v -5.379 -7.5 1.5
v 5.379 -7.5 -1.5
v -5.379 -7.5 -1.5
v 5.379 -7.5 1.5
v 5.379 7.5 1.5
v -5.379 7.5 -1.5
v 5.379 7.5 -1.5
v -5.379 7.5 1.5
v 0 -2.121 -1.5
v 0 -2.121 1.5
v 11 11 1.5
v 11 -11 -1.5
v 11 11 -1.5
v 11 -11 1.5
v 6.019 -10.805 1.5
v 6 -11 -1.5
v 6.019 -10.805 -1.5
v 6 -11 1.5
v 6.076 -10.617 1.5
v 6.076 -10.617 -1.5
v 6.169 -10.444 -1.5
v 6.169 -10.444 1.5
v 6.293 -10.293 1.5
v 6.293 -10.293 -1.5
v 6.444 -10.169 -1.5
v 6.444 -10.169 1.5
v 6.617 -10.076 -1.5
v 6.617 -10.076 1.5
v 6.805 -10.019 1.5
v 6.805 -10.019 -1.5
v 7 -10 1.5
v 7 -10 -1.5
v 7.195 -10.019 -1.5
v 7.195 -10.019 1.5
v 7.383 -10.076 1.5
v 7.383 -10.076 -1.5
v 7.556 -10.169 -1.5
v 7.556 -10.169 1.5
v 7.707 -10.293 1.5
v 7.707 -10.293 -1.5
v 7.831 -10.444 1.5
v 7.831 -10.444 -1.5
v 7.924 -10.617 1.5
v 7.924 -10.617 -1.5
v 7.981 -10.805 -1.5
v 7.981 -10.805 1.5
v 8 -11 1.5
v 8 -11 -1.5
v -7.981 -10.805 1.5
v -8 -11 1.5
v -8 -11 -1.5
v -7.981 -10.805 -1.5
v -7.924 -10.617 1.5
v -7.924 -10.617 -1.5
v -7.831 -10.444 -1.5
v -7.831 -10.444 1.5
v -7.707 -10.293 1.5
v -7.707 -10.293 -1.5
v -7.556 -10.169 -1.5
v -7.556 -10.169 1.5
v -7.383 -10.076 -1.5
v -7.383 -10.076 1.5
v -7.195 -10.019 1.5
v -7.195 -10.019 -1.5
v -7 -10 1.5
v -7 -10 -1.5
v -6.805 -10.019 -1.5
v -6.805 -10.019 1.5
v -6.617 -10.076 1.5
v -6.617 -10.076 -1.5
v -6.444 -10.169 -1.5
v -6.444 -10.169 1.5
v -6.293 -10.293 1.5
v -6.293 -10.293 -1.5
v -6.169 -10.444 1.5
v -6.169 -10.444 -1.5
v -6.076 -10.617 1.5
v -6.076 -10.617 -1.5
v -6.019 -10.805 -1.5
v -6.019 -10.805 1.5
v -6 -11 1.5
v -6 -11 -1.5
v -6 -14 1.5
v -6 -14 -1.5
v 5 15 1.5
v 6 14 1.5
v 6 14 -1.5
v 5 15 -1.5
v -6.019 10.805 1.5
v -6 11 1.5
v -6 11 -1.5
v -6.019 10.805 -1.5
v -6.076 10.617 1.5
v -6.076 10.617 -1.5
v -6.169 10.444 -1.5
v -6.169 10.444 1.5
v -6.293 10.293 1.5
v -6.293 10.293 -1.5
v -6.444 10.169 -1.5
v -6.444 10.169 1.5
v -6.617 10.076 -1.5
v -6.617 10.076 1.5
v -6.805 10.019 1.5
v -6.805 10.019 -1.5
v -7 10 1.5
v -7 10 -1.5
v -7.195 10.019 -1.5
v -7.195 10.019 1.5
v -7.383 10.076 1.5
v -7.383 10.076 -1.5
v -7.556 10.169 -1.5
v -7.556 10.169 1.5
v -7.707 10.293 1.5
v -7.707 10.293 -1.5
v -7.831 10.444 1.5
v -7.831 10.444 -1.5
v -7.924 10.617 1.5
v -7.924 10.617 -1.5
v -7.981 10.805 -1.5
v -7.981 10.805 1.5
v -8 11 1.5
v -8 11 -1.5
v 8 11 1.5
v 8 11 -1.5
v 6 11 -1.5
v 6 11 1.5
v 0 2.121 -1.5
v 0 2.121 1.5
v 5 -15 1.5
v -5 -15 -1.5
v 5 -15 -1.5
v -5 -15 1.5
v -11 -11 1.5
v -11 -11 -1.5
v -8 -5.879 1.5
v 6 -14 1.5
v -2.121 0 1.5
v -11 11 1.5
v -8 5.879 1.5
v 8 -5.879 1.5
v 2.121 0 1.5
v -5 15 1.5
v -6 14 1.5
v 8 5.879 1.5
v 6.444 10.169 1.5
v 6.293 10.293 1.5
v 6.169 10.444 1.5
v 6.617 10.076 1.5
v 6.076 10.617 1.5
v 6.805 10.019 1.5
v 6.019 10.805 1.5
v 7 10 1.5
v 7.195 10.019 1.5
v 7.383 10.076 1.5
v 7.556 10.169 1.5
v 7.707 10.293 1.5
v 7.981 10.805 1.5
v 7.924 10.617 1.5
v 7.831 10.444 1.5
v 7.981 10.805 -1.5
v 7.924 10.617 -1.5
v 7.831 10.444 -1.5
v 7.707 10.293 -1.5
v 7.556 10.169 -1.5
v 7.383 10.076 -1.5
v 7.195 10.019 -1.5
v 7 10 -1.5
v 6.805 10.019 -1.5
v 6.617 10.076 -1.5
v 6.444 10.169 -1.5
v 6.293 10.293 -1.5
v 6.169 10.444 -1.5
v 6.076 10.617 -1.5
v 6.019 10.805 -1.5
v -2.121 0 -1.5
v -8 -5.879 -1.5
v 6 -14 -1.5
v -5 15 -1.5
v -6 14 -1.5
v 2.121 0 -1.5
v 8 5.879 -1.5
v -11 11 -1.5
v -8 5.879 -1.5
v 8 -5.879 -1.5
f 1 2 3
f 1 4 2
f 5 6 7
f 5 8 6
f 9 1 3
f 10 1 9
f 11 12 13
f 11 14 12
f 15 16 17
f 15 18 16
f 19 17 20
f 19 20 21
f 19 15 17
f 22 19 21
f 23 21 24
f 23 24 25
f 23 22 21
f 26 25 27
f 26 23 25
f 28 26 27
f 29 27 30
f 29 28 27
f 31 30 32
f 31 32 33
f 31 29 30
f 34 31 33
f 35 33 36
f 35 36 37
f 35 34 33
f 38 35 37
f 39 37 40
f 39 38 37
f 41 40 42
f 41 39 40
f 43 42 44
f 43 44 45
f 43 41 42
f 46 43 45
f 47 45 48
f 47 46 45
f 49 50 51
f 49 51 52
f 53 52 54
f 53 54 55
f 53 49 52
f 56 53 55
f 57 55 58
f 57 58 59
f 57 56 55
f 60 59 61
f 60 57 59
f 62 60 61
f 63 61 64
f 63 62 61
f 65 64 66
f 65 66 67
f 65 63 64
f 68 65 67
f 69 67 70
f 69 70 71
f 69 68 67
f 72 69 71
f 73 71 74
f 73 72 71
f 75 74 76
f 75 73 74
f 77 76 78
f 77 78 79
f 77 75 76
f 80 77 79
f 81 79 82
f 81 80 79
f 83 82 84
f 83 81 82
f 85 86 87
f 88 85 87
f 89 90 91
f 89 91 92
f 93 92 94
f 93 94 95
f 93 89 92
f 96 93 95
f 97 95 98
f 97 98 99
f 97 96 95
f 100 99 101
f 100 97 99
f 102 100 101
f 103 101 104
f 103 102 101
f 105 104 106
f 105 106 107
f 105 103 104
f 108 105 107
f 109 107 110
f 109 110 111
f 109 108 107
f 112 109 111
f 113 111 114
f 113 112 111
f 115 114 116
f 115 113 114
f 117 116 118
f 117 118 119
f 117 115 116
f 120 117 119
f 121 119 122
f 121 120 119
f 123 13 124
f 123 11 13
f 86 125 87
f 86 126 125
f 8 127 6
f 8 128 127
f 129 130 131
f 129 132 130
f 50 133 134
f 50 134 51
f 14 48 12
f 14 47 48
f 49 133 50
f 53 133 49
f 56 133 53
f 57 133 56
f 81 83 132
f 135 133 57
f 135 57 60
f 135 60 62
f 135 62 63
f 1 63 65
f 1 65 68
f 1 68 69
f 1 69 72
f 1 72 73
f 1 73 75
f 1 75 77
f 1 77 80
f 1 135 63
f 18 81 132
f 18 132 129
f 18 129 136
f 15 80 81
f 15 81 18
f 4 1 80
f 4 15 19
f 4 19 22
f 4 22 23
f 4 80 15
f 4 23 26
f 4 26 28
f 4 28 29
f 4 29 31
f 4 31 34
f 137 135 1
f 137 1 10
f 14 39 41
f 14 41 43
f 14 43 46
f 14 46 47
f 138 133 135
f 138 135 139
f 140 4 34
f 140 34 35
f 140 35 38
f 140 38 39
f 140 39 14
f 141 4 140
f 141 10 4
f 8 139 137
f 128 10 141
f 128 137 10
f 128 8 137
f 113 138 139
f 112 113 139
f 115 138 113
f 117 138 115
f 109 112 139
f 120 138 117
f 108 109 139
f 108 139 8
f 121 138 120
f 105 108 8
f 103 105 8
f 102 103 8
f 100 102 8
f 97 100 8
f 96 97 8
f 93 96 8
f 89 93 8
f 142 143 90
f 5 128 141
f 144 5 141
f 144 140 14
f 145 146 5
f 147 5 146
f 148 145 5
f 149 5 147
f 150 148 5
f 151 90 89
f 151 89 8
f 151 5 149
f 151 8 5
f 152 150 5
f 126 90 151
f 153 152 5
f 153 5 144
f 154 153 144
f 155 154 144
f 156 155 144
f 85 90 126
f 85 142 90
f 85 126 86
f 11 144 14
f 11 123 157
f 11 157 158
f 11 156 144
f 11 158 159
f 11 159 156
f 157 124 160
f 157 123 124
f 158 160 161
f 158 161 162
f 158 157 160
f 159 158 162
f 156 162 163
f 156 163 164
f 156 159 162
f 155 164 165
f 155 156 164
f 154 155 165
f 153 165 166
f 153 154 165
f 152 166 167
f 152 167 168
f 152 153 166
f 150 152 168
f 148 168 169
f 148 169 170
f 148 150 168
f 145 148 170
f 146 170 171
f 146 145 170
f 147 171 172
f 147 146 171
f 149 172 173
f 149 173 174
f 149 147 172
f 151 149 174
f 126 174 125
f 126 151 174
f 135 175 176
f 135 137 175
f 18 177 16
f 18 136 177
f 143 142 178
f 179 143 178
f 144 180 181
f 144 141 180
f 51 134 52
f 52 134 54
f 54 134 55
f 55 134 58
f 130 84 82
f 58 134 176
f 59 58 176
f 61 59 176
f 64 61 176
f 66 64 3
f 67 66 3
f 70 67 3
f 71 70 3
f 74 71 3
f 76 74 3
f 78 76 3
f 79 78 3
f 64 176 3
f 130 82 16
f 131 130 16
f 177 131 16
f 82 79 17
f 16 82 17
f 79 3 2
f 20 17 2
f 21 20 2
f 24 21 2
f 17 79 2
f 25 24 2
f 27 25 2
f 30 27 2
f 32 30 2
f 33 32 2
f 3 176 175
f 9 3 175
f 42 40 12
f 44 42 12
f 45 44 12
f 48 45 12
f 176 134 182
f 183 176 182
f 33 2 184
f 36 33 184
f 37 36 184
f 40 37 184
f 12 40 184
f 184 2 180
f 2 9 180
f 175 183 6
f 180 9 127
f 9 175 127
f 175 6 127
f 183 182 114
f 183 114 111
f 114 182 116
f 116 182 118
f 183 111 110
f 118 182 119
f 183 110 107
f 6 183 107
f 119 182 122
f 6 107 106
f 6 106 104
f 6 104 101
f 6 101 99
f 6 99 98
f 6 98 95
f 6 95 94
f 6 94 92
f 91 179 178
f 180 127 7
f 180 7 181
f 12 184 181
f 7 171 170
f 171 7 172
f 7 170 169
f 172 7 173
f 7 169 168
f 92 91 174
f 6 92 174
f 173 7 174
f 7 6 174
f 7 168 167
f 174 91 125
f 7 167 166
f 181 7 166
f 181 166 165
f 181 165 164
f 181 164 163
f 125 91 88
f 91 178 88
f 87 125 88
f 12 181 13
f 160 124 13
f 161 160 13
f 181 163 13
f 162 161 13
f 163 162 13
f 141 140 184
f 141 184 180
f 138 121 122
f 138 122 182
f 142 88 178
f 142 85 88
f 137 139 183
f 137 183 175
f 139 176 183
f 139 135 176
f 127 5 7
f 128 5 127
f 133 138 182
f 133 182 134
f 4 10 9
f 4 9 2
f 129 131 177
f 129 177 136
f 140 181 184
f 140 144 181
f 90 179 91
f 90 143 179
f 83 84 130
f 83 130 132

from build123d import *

# Parameters (mm, degrees)
EXTRUDE_1_DEPTH = 1.5
CHAMFER_1_SIZE  = 1


with BuildPart() as part:
    # 草图1 → 凸台-拉伸1 (new, symmetric)
    with BuildSketch(Plane.XY):
        with BuildLine():
            Line((-6, 15), (-6, 11))
            ThreePointArc((-6, 11), (-7, 10), (-8, 11))
            Line((-8, 11), (-11, 11))
            Line((-11, 11), (-11, -11))
            Line((-11, -11), (-8, -11))
            ThreePointArc((-8, -11), (-7, -10), (-6, -11))
            Line((-6, -11), (-6, -15))
            Line((-6, -15), (6, -15))
            Line((6, -15), (6, -11))
            ThreePointArc((6, -11), (7, -10), (8, -11))
            Line((8, -11), (11, -11))
            Line((11, -11), (11, 11))
            Line((11, 11), (8, 11))
            ThreePointArc((8, 11), (7, 10), (6, 11))
            Line((6, 11), (6, 15))
            Line((6, 15), (-6, 15))
        make_face()
        Polygon((5.378679656, 7.5), (0, 2.121320344), (-5.378679656, 7.5), align=None, mode=Mode.SUBTRACT)
        Polygon((0, -2.121320344), (5.378679656, -7.5), (-5.378679656, -7.5), align=None, mode=Mode.SUBTRACT)
        Polygon((-8, 5.878679656), (-2.121320344, 0), (-8, -5.878679656), align=None, mode=Mode.SUBTRACT)
        Polygon((8, -5.878679656), (2.121320344, 0), (8, 5.878679656), align=None, mode=Mode.SUBTRACT)
    extrude(amount=EXTRUDE_1_DEPTH, both=True)

    # 倒角1
    chamfer_1_edges = [part.edges().sort_by_distance(p)[0] for p in [
        (-6, 15, 0),
        (6, 15, 0),
        (6, -15, 0),
        (-6, -15, 0),
    ]]
    chamfer(chamfer_1_edges, length=CHAMFER_1_SIZE)


solid = part.part
